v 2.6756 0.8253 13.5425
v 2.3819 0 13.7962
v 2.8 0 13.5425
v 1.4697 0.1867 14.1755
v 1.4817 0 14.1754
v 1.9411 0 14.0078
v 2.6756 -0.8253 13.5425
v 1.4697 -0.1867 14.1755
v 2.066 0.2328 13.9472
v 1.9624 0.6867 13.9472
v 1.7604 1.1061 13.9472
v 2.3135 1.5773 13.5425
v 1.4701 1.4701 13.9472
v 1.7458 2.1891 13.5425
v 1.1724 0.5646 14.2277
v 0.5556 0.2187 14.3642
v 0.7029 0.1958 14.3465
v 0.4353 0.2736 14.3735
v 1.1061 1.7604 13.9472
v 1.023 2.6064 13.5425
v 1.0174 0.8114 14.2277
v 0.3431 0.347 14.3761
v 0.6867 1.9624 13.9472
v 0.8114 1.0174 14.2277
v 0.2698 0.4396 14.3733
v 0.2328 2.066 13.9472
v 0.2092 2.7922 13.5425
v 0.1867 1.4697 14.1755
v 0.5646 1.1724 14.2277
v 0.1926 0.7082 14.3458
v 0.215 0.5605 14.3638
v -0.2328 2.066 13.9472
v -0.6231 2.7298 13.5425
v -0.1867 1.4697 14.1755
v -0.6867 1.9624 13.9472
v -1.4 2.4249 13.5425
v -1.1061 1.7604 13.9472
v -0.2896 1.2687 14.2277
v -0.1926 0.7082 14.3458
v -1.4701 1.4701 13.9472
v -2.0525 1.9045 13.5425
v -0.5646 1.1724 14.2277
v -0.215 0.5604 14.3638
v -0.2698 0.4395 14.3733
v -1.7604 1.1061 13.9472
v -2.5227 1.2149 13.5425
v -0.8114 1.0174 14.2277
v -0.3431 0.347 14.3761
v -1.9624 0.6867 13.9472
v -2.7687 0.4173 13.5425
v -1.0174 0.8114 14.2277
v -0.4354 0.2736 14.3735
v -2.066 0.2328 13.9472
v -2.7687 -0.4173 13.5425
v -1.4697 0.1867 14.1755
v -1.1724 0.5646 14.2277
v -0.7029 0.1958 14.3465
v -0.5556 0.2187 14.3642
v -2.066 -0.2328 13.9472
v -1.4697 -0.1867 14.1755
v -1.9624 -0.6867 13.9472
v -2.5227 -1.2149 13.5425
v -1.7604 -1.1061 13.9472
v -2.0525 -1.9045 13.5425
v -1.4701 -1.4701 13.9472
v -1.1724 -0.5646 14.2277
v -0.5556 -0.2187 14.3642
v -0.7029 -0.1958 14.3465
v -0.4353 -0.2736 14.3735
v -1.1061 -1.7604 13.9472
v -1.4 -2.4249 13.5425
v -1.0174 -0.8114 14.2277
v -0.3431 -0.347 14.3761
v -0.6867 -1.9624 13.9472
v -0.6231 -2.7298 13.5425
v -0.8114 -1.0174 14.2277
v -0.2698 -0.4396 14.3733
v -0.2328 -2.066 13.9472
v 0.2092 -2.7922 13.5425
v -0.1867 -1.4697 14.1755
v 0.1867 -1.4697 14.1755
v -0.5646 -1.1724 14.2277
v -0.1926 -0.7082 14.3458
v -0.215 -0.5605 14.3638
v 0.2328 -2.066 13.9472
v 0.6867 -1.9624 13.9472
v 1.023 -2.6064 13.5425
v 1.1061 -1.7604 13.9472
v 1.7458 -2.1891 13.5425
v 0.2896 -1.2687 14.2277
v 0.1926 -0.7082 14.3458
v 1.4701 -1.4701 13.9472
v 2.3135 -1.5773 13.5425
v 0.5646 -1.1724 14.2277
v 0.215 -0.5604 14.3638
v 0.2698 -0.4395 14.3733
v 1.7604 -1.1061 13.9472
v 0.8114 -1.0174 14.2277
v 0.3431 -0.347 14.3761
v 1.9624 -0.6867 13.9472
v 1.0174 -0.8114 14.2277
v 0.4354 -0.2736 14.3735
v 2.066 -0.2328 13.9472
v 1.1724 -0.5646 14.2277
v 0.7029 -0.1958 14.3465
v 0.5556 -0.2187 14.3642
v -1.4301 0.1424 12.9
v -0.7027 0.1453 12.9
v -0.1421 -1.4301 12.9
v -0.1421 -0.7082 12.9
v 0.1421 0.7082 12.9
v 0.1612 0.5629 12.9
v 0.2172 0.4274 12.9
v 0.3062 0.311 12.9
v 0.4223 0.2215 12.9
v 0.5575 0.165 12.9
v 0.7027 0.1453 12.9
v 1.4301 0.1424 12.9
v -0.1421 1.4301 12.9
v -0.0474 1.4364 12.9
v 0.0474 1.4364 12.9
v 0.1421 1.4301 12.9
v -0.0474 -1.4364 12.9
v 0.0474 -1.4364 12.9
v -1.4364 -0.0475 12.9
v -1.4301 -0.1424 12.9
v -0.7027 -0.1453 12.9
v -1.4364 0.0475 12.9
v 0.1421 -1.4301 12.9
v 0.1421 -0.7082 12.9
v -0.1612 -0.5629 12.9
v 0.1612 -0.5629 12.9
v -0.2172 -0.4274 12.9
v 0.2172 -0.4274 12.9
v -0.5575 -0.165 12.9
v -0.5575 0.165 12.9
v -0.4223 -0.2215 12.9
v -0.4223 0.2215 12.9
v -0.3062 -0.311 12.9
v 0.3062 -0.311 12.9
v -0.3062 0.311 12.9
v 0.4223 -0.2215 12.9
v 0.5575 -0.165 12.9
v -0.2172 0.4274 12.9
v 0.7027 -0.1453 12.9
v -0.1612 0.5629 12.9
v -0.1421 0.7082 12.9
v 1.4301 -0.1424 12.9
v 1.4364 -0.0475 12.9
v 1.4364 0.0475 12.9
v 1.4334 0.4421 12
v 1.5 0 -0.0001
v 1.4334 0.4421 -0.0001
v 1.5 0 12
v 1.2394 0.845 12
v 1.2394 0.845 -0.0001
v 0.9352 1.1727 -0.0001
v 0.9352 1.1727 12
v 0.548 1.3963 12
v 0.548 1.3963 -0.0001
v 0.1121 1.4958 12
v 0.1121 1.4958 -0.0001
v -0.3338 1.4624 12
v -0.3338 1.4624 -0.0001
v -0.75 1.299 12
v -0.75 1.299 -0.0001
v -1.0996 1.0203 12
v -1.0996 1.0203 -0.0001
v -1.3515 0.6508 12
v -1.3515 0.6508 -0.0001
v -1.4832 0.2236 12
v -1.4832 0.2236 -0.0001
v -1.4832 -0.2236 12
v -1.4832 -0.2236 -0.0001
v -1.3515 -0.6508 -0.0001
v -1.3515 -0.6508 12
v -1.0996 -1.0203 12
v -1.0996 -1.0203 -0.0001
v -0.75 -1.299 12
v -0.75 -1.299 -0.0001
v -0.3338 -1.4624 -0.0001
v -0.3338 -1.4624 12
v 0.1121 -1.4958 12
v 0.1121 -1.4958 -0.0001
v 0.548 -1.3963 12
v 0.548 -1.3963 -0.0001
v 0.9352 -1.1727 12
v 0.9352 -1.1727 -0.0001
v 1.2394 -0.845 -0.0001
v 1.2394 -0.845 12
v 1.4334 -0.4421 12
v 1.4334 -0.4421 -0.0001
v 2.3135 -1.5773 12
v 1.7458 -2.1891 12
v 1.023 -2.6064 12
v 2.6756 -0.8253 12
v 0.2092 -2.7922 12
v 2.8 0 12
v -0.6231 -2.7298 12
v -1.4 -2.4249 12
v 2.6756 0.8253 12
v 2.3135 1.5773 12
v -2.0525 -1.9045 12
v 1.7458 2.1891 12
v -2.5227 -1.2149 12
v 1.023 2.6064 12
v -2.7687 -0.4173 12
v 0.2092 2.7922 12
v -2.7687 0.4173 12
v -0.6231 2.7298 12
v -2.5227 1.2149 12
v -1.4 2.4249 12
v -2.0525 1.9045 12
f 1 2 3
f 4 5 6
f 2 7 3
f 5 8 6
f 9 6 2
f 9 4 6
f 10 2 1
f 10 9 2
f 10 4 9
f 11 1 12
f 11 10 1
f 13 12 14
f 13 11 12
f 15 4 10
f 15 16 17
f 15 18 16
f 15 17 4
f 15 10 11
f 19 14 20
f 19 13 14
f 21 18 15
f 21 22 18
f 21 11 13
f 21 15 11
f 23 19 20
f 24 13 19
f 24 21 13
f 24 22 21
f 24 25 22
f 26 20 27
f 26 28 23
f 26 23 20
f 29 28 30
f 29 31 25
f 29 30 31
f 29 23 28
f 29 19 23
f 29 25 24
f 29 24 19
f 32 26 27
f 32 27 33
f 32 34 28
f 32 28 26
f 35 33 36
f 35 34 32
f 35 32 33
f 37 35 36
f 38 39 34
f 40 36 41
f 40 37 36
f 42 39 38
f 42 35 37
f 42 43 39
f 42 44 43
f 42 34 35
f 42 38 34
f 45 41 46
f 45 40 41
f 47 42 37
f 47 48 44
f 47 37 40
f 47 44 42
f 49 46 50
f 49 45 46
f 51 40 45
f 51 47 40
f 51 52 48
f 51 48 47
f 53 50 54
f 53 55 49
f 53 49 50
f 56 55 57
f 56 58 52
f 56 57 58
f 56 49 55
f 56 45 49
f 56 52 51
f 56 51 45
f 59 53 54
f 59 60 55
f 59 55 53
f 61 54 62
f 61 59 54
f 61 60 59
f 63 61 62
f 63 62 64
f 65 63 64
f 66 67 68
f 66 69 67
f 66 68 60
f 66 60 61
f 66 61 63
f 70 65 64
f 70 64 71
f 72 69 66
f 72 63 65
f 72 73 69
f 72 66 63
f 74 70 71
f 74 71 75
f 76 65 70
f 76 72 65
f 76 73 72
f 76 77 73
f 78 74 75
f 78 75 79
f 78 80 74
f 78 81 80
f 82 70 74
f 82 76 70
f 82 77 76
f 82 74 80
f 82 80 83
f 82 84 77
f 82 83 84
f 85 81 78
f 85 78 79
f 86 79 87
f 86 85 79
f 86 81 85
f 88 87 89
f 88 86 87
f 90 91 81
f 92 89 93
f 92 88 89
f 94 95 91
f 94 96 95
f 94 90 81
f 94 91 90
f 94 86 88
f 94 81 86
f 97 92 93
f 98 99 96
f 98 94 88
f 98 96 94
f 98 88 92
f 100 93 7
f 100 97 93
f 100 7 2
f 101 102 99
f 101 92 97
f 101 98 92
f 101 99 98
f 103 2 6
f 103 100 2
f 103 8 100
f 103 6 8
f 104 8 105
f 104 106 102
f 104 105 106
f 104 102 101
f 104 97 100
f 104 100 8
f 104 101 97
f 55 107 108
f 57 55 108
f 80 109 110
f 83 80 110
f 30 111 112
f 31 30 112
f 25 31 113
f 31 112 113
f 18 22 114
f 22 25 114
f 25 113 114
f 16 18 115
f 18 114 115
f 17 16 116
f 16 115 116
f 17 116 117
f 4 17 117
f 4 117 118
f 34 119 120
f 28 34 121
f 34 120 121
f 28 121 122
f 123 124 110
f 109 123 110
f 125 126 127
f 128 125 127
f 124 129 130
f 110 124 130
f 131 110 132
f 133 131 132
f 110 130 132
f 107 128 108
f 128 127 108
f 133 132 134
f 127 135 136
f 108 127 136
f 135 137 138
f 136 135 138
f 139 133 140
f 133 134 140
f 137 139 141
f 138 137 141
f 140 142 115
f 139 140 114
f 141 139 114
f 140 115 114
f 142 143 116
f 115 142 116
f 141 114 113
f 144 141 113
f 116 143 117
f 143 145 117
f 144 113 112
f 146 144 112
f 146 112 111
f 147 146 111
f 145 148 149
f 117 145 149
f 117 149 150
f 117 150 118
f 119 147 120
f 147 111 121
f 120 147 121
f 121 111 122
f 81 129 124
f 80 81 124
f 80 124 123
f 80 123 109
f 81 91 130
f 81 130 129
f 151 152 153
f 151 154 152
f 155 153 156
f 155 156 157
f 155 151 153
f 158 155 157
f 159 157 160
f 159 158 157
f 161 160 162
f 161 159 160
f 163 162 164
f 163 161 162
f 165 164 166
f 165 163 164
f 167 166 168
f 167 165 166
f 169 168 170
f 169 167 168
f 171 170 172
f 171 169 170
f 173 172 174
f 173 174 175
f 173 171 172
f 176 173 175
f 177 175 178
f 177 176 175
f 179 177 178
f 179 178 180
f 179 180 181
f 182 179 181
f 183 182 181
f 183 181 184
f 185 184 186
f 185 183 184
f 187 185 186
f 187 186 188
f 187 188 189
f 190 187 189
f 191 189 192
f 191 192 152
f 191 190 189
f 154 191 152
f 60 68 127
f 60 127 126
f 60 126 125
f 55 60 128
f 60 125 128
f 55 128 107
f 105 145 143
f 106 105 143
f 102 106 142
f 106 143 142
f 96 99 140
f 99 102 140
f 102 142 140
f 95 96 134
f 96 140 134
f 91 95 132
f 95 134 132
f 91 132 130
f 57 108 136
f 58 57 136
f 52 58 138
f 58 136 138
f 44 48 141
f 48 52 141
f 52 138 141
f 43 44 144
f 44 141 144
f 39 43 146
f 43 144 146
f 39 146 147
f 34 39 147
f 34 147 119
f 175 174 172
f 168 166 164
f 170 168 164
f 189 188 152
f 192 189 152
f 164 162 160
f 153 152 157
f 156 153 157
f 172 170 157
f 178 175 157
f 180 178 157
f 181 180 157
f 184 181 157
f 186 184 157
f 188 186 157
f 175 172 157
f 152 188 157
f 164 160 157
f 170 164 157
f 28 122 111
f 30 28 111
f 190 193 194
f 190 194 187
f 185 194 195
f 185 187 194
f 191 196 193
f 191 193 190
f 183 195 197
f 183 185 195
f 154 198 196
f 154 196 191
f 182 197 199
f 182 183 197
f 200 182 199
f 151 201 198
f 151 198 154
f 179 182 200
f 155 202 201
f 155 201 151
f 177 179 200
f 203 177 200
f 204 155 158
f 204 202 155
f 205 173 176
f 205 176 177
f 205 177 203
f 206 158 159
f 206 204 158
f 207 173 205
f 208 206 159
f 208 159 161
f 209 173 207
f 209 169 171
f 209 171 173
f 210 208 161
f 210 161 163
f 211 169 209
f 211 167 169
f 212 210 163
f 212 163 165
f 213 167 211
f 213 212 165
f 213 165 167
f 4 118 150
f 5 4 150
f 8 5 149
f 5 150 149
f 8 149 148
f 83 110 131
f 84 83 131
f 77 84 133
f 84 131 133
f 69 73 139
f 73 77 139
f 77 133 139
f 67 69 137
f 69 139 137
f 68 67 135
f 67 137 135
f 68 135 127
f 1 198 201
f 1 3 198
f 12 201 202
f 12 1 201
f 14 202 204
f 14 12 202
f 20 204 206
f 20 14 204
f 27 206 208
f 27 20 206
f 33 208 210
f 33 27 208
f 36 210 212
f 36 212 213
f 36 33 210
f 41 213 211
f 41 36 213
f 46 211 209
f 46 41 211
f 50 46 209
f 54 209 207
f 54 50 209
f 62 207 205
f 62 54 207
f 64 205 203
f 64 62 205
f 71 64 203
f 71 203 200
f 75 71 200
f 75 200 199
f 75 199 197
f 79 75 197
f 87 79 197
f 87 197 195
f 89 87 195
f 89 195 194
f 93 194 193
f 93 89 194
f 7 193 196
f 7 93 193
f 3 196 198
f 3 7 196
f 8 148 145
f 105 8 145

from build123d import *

# Parameters (mm, degrees)
SKETCH1_R               = 1.5
BASE_EXTRUDE_DEPTH      = 12
BASE_EXTRUDE_DEPTH_BACK = 0.0001
CUT_EXTRUDE1_DEPTH      = 1.799999969
CUT_EXTRUDE1_TAPER      = 2


with BuildPart() as part:
    # Sketch1 → Base-Extrude (new body, two sides)
    with BuildSketch(Plane.XY) as base_extrude_sk:
        Circle(SKETCH1_R)
    extrude(amount=BASE_EXTRUDE_DEPTH)
    extrude(base_extrude_sk.sketch, amount=-BASE_EXTRUDE_DEPTH_BACK)

    # Sketch6 → Boss-Revolve2 (revolve)
    with BuildSketch(Plane(origin=(0, 0, 0), x_dir=(1, 0, 0), z_dir=(0, 1, 0))):
        with BuildLine():
            Line((0, -12), (2.7999999, -12))
            Line((2.7999999, -12), (2.7999999, -13.54246308))
            ThreePointArc((2.7999999, -13.54246308), (1.46418655, -14.180811406), (0, -14.4))
            Line((0, -14.4), (0, -12))
        make_face()
    revolve(axis=Axis((0, 0, -0.393620135), (0, 0, 1)))

    # Sketch7 → Cut-Extrude1 (cut)
    with BuildSketch(Plane(origin=(0, 0, 14.7000001), x_dir=(-1, 0, 0), z_dir=(0, 0, -1))):
        with BuildLine():
            ThreePointArc((0.205000004, 1.48592565), (0, 1.500000013), (-0.205000004, 1.48592565))
            Line((-0.205000004, 1.48592565), (-0.205000004, 0.708178558))
            ThreePointArc((-0.205000004, 0.708178558), (-0.35072876, 0.355344481), (-0.702967546, 0.208182689))
            Line((-0.702967546, 0.208182689), (-1.48592565, 0.205000004))
            ThreePointArc((-1.48592565, 0.205000004), (-1.500000013, 0), (-1.48592565, -0.205000004))
            Line((-1.48592565, -0.205000004), (-0.702967546, -0.208182689))
            ThreePointArc((-0.702967546, -0.208182689), (-0.35072876, -0.355344481), (-0.205000004, -0.708178558))
            Line((-0.205000004, -0.708178558), (-0.205000004, -1.48592565))
            ThreePointArc((-0.205000004, -1.48592565), (0, -1.500000013), (0.205000004, -1.48592565))
            Line((0.205000004, -1.48592565), (0.205000004, -0.708178558))
            ThreePointArc((0.205000004, -0.708178558), (0.35072876, -0.355344481), (0.702967546, -0.208182689))
            Line((0.702967546, -0.208182689), (1.48592565, -0.205000004))
            ThreePointArc((1.48592565, -0.205000004), (1.500000013, 0), (1.48592565, 0.205000004))
            Line((1.48592565, 0.205000004), (0.702967546, 0.208182689))
            ThreePointArc((0.702967546, 0.208182689), (0.35072876, 0.355344481), (0.205000004, 0.708178558))
            Line((0.205000004, 0.708178558), (0.205000004, 1.48592565))
        make_face()
    extrude(amount=CUT_EXTRUDE1_DEPTH, taper=CUT_EXTRUDE1_TAPER, mode=Mode.SUBTRACT)


solid = part.part
